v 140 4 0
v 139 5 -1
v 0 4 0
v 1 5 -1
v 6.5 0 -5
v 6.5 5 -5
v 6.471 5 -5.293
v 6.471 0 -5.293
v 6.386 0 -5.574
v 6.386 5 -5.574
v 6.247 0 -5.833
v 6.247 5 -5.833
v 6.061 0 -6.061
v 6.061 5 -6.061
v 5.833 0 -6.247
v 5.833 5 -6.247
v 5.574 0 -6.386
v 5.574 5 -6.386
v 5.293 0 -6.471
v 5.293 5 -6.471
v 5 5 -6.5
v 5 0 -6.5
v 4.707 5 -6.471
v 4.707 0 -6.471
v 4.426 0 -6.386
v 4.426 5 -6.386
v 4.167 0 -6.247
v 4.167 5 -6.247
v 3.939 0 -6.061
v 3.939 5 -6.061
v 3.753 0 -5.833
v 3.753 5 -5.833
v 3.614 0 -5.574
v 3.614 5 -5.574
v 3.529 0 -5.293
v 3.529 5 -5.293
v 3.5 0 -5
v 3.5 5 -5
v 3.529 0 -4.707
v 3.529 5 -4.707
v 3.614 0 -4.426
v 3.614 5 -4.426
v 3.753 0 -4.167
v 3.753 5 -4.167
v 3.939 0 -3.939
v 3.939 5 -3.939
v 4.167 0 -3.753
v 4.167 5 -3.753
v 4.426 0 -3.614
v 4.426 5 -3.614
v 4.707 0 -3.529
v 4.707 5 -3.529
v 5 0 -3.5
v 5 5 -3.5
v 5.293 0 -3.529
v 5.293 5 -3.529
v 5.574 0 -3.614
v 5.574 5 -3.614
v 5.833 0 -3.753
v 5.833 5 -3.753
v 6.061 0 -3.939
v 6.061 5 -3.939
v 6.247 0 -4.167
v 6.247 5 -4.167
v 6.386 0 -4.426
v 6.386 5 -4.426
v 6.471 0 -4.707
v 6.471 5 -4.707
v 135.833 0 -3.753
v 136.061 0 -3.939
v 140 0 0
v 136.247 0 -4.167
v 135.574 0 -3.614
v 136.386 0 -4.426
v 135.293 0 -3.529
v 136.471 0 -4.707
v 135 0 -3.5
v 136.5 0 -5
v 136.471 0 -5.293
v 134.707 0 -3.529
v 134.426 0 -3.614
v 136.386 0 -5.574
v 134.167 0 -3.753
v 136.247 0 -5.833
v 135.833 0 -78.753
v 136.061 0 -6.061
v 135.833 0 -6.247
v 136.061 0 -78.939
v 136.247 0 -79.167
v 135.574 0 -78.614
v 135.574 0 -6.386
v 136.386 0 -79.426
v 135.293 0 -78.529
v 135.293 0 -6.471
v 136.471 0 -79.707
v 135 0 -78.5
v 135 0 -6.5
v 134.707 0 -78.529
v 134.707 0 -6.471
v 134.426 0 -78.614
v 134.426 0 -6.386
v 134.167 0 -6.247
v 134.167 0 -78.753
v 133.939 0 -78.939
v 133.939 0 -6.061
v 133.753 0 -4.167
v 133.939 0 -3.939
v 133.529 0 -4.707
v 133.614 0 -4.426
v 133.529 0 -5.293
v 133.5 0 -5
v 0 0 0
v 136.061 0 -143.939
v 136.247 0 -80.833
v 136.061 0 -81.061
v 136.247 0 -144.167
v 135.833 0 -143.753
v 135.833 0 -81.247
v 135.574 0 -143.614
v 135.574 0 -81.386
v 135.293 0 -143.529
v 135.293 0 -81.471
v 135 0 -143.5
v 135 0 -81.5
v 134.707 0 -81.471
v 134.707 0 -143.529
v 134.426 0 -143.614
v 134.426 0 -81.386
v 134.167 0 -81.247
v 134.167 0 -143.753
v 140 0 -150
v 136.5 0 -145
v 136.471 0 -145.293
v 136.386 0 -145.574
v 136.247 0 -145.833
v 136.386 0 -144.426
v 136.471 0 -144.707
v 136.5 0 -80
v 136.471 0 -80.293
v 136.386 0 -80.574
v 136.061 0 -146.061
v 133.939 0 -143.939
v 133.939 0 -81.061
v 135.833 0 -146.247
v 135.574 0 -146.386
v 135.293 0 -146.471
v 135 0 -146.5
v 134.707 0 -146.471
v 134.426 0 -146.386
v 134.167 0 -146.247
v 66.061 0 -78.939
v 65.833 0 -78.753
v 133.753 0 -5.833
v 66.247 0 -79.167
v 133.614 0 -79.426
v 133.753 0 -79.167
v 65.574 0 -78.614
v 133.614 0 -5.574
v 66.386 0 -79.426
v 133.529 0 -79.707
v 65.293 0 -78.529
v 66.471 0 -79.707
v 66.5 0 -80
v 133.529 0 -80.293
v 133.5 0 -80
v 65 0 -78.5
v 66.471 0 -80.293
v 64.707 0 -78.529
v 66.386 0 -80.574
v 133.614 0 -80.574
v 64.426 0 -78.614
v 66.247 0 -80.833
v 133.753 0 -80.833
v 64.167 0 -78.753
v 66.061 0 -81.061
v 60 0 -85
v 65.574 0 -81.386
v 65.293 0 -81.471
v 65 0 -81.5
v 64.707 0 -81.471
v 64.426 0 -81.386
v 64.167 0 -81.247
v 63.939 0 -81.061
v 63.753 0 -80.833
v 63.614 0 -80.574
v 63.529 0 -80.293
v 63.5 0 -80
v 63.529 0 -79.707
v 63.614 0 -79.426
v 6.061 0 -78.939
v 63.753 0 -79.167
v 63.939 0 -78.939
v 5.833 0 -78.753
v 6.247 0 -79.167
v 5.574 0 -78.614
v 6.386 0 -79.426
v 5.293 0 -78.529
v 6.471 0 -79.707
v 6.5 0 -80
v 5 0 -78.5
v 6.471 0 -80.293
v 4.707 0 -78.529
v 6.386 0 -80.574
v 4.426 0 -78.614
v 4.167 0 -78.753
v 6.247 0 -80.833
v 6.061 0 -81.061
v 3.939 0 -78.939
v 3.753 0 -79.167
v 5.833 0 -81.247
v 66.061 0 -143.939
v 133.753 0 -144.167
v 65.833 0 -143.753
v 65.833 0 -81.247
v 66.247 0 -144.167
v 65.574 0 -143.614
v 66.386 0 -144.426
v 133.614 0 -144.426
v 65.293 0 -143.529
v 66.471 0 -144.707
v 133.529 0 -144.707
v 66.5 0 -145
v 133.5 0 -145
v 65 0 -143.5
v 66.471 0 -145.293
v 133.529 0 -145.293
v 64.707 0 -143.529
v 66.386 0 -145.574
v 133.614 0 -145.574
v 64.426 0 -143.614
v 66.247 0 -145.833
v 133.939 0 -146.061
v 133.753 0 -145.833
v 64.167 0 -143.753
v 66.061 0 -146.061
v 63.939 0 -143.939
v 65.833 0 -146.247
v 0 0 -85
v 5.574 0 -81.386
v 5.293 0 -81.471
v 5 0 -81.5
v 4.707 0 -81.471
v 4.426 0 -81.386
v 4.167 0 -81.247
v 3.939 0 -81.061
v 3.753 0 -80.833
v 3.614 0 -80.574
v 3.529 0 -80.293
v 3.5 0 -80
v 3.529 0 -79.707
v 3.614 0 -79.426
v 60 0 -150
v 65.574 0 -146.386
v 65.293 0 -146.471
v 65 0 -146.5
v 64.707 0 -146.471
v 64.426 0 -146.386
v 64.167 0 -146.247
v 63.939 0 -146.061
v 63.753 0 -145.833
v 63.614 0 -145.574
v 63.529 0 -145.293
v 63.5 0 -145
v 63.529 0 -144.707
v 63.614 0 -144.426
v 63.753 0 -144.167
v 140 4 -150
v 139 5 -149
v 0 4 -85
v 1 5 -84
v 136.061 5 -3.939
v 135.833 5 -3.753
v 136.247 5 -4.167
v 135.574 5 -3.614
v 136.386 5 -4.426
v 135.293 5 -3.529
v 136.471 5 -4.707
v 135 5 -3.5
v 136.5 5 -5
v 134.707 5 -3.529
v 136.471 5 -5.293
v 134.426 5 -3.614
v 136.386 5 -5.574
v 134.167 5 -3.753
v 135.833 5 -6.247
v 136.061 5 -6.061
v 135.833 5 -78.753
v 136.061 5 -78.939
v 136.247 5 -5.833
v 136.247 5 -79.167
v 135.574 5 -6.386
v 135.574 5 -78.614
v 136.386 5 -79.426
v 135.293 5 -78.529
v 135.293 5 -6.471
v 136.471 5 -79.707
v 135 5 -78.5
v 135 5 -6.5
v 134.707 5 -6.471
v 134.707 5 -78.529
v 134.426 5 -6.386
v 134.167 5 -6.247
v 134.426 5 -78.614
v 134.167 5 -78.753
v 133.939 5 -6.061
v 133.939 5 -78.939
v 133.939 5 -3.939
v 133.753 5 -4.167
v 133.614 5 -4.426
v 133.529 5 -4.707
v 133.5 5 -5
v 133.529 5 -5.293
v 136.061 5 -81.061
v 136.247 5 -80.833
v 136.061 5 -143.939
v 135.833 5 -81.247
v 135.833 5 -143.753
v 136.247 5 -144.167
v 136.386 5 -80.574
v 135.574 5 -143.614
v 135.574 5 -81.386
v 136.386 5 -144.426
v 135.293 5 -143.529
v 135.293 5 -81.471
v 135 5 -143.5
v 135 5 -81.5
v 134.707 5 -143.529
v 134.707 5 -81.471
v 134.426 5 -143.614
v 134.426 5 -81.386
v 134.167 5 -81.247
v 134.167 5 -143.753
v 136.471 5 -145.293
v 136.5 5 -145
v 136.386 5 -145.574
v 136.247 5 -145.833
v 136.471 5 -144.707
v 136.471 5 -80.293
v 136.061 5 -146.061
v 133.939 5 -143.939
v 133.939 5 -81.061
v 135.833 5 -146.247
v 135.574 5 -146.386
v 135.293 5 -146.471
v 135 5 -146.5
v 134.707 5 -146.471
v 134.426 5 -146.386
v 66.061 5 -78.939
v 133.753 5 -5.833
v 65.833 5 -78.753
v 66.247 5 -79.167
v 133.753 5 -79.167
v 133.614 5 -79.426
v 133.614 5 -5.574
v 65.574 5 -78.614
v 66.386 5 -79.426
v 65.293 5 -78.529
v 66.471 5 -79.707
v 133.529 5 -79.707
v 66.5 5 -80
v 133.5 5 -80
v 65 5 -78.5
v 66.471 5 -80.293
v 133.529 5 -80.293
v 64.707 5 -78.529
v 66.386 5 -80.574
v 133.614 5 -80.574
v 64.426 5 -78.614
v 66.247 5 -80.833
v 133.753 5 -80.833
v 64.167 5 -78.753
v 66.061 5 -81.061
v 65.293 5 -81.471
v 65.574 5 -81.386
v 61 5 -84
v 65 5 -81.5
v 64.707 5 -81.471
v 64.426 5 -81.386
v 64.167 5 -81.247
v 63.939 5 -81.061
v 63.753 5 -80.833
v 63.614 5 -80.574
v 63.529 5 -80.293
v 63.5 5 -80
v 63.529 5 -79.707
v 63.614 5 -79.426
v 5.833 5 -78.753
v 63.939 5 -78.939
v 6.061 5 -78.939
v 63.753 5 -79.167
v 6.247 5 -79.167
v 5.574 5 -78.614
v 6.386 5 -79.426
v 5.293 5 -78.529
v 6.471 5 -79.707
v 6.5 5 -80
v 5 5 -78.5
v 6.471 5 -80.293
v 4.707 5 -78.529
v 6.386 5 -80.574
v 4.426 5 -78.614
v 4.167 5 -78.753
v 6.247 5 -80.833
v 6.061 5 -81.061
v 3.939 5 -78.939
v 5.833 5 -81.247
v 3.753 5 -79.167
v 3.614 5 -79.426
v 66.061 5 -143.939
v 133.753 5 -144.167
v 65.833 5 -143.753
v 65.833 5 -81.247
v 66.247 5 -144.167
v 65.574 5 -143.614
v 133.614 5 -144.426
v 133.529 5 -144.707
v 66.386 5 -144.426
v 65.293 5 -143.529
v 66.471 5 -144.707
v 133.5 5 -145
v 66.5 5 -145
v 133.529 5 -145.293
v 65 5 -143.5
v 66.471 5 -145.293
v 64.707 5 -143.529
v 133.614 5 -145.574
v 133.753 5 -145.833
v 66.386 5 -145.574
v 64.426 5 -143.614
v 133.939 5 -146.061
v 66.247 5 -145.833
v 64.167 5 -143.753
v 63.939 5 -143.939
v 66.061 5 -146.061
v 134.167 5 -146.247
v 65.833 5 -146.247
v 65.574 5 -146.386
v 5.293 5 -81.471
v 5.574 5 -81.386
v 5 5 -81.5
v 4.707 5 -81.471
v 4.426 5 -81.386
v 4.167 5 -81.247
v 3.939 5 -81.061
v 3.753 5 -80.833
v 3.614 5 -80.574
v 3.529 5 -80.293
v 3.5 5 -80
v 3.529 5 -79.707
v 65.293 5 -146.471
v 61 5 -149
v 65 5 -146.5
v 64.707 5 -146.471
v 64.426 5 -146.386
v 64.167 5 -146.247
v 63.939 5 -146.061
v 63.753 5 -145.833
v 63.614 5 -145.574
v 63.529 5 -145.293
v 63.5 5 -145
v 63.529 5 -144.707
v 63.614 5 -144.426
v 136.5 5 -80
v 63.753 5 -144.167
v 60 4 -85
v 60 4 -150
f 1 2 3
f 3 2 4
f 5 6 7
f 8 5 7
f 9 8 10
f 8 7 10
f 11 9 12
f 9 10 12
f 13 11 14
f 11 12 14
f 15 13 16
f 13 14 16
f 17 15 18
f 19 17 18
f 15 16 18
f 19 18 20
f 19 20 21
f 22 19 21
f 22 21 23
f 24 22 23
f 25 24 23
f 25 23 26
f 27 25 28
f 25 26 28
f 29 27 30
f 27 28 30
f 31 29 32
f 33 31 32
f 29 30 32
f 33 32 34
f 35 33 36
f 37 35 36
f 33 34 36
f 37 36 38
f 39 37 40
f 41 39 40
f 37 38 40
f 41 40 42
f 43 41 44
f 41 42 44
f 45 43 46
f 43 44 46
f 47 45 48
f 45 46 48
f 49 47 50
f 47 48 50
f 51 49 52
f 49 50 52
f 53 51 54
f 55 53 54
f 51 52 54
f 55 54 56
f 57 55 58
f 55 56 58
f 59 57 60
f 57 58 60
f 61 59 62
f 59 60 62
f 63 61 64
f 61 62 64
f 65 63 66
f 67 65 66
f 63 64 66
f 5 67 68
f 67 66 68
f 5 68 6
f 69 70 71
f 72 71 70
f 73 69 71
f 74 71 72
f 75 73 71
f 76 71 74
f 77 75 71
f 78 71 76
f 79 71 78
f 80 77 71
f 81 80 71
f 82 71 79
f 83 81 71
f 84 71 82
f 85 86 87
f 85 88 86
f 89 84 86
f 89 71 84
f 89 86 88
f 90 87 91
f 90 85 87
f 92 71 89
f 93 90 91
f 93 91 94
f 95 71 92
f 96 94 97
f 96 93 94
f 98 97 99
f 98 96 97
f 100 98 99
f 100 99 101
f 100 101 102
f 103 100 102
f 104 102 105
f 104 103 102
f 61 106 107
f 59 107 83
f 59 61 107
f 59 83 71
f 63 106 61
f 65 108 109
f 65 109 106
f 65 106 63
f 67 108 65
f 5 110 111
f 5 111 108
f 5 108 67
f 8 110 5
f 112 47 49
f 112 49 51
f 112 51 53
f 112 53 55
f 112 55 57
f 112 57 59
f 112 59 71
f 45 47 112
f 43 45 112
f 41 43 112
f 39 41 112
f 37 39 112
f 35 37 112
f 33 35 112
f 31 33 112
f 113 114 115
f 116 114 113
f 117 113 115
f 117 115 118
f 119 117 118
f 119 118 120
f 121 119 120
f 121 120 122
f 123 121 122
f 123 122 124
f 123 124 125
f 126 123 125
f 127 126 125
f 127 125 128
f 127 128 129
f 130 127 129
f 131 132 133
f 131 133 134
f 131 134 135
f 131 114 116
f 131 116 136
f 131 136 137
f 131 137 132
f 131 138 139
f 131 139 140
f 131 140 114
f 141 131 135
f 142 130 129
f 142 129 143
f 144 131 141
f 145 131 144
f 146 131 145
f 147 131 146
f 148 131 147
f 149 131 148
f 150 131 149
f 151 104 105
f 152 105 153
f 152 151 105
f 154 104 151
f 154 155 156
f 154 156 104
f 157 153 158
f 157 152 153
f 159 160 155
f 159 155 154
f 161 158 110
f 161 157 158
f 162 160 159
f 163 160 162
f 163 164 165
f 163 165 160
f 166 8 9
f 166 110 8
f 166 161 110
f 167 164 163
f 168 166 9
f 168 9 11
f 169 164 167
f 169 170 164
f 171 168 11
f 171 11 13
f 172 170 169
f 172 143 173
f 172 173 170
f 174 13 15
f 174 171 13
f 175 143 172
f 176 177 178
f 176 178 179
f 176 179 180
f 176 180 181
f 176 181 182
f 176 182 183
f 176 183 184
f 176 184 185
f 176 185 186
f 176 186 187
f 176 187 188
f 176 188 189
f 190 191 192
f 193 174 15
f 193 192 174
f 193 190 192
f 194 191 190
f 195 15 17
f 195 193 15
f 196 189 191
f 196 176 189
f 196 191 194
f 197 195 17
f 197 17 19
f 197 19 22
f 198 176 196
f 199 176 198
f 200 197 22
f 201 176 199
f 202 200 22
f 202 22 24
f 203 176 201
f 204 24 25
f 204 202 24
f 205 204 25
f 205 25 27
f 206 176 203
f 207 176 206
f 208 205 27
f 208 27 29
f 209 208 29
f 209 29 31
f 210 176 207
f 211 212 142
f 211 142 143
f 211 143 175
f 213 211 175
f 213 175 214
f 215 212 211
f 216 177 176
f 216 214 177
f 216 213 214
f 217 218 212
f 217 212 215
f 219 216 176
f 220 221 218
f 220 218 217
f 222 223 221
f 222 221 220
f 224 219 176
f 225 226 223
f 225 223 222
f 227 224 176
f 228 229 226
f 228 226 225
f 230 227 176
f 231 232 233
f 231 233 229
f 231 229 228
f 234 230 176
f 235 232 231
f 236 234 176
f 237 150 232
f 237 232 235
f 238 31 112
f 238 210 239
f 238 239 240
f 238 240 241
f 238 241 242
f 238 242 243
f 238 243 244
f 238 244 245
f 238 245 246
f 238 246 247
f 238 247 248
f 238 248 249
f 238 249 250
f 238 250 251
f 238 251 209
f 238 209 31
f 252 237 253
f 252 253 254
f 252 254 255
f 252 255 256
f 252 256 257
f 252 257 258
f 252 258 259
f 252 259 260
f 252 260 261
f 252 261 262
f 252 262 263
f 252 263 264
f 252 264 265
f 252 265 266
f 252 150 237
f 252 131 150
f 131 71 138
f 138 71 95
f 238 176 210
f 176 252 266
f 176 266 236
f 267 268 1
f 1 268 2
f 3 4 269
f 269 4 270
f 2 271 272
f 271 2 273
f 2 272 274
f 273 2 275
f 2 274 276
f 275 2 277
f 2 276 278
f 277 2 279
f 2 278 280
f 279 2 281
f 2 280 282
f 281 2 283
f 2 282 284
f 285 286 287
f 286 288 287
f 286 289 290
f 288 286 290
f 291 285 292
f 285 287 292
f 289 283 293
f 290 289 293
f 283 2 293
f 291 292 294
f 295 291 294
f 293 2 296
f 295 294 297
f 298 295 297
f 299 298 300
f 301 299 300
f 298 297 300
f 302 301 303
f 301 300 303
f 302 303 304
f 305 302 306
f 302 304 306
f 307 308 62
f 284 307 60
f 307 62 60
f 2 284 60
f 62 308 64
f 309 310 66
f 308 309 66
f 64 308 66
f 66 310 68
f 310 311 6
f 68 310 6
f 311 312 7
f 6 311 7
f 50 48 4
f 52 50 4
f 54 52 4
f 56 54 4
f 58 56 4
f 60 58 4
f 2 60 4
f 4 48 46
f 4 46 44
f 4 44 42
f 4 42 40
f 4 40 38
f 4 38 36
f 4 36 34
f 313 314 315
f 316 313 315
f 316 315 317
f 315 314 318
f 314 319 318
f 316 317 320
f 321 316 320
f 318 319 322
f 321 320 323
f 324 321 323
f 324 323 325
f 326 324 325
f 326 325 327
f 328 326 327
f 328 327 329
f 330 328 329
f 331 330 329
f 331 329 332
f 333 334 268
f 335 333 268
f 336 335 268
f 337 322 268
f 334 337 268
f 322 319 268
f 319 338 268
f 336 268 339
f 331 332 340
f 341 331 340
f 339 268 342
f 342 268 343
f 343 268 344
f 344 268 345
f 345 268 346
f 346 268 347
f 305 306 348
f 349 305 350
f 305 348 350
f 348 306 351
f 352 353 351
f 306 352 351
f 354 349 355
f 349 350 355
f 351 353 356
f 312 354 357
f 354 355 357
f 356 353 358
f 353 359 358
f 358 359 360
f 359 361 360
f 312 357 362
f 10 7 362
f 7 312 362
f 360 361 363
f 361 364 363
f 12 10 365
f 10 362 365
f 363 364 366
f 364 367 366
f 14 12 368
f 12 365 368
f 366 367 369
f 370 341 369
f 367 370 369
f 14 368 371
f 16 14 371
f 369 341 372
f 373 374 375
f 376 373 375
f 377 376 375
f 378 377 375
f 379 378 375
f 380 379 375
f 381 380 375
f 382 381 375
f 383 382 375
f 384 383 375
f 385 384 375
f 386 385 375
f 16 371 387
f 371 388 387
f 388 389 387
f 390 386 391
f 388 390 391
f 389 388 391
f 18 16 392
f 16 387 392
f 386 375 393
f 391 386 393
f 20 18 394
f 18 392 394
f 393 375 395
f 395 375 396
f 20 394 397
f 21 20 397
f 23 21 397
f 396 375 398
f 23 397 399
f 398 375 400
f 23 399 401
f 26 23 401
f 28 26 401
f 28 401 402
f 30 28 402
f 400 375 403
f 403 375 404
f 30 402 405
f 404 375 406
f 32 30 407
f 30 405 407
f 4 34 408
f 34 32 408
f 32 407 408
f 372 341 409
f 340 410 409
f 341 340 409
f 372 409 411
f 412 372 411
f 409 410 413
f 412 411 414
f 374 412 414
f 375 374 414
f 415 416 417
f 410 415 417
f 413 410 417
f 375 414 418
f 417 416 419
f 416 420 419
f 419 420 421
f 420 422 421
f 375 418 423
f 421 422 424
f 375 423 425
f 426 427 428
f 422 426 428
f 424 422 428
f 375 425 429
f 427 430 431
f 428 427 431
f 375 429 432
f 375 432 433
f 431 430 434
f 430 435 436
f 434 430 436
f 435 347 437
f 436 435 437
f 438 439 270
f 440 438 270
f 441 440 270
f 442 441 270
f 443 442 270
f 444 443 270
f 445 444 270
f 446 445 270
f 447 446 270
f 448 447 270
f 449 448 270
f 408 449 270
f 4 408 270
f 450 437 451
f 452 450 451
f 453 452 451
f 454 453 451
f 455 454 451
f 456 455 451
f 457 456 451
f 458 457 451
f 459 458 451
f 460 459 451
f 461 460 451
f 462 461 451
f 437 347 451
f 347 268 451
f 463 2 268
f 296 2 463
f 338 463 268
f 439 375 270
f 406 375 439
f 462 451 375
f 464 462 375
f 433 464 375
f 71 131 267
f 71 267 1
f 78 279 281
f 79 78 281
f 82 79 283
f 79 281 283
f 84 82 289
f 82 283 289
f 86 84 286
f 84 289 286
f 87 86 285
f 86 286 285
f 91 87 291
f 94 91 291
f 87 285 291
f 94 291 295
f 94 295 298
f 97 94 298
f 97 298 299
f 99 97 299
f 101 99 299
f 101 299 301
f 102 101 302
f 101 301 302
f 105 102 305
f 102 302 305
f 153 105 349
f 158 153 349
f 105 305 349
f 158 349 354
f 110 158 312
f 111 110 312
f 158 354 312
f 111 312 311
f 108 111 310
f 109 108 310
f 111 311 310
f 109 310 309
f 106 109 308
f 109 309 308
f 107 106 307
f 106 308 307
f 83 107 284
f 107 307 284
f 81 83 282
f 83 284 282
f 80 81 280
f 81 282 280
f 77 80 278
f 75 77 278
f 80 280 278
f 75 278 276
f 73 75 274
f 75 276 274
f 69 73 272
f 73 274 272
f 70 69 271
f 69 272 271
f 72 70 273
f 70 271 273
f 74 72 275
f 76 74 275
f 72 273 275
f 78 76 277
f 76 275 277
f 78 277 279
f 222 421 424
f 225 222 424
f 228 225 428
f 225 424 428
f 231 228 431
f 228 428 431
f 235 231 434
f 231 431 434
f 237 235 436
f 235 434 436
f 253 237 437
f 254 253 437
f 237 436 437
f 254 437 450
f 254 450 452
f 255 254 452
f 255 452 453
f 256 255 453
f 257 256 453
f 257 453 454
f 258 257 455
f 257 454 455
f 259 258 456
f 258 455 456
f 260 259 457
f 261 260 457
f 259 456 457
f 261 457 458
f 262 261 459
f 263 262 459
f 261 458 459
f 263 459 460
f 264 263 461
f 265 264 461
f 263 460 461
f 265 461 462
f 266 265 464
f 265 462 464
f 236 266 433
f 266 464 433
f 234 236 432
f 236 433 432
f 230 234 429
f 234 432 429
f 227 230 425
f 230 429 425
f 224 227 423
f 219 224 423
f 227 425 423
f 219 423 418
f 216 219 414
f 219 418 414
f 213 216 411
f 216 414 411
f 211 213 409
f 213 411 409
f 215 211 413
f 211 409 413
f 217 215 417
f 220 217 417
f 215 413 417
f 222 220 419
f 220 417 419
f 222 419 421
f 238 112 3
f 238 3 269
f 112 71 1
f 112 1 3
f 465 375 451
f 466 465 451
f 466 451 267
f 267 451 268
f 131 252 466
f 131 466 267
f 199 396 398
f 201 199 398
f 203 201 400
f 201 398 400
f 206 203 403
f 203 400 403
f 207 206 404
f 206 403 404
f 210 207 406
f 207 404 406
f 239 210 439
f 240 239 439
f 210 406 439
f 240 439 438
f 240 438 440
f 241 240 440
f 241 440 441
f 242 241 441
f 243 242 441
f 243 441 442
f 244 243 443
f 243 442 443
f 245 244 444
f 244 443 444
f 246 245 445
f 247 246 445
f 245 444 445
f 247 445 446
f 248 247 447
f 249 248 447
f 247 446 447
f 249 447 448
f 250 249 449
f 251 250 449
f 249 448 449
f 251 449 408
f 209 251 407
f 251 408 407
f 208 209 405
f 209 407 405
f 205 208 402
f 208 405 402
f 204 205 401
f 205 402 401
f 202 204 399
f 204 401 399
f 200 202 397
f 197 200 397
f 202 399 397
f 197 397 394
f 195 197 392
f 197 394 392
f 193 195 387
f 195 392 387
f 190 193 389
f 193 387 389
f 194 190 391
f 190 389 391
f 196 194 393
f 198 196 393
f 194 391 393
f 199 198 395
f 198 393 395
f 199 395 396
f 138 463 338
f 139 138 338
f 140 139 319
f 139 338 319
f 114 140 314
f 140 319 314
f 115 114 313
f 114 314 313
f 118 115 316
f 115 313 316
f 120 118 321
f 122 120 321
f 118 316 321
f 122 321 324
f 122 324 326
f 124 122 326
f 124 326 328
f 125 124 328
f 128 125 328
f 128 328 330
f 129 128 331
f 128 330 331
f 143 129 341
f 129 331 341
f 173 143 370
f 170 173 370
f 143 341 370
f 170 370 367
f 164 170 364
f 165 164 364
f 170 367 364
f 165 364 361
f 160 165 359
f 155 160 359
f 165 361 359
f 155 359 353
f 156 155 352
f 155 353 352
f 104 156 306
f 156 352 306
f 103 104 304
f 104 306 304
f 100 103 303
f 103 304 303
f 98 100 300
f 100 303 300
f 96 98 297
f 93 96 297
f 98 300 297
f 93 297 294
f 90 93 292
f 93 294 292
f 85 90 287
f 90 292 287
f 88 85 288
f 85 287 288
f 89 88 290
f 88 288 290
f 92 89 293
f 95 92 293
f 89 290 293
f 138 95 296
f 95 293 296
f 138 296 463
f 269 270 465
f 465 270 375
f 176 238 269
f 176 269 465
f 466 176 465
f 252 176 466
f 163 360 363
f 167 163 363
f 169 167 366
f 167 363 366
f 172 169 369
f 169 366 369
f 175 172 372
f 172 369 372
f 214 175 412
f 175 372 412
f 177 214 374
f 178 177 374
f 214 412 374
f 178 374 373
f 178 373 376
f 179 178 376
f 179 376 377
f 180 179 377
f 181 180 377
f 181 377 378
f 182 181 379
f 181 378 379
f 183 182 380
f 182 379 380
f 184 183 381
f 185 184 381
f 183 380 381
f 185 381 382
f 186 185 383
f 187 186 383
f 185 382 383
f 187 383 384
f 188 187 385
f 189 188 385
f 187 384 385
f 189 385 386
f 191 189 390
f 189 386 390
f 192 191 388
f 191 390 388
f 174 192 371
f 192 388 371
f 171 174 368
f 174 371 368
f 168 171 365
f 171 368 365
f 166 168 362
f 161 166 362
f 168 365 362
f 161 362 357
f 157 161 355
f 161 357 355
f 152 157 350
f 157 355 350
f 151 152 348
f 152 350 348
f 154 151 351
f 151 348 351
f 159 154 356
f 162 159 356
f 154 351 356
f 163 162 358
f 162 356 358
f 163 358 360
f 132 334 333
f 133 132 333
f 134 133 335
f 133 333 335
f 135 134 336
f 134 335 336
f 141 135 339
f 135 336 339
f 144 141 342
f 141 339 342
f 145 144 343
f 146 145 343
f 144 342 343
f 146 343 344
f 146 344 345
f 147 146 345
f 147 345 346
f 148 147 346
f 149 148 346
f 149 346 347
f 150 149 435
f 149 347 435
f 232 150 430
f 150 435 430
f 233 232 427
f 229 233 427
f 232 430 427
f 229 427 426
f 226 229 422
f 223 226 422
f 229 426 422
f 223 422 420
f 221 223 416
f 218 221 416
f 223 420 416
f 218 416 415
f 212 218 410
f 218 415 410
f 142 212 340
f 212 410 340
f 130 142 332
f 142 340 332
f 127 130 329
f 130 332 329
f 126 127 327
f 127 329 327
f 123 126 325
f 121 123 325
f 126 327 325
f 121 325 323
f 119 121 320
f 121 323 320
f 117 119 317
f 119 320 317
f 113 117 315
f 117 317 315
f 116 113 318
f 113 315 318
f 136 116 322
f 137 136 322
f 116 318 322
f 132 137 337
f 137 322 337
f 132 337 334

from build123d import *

# Parameters (mm, degrees)
BOSS_EXTRUDE1_DEPTH  = 5
CHAMFER1_SIZE        = 1
SKETCH2_R            = 1.5
CUT_EXTRUDE1_DEPTH   = 5
LPATTERN1_COUNT      = 2
LPATTERN1_PITCH      = 130
LPATTERN1_COUNT_DIR2 = 2
LPATTERN1_PITCH_DIR2 = 75
SKETCH3_R            = 1.5
CUT_EXTRUDE2_DEPTH   = 5
LPATTERN2_COUNT      = 2
LPATTERN2_PITCH      = 70
LPATTERN3_COUNT      = 2
LPATTERN3_PITCH      = 65


with BuildPart() as part:
    # Sketch1 → Boss-Extrude1 (new body)
    with BuildSketch(Plane(origin=(0, 0, 0), x_dir=(1, 0, 0), z_dir=(0, 1, 0))):
        Polygon((140, 150), (140, 0), (0, 0), (0, 85), (60, 85), (60, 150), align=None)
    extrude(amount=BOSS_EXTRUDE1_DEPTH)

    # Chamfer1
    chamfer1_edges = [part.edges().sort_by_distance(p)[0] for p in [
        (140, 5, -75),
        (100, 5, -150),
        (60, 5, -117.5),
        (30, 5, -85),
        (0, 5, -42.5),
        (70, 5, 0),
    ]]
    chamfer(chamfer1_edges, length=CHAMFER1_SIZE)

    # Sketch2 → Cut-Extrude1 (cut)
    with BuildSketch(Plane(origin=(0, 5, 0), x_dir=(1, 0, 0), z_dir=(0, 1, 0))):
        with Locations((5, 80)):
            Circle(SKETCH2_R)
    cut_extrude1 = extrude(amount=-CUT_EXTRUDE1_DEPTH, mode=Mode.SUBTRACT)

    # LPattern1: Cut-Extrude1 2 × 2
    with Locations(*[(i * LPATTERN1_PITCH, 0, j * LPATTERN1_PITCH_DIR2) for i in range(LPATTERN1_COUNT) for j in range(LPATTERN1_COUNT_DIR2) if (i, j) != (0, 0)]):
        add(cut_extrude1, mode=Mode.SUBTRACT)

    # Sketch3 → Cut-Extrude2 (cut)
    with BuildSketch(Plane(origin=(0, 5, 0), x_dir=(1, 0, 0), z_dir=(0, 1, 0))):
        with Locations((65, 145)):
            Circle(SKETCH3_R)
    cut_extrude2 = extrude(amount=-CUT_EXTRUDE2_DEPTH, mode=Mode.SUBTRACT)

    # LPattern2: Cut-Extrude2 ×2
    with Locations(*[(i * LPATTERN2_PITCH, 0, 0) for i in range(1, LPATTERN2_COUNT)]):
        add(cut_extrude2, mode=Mode.SUBTRACT)

    # LPattern3: Cut-Extrude2 ×2
    with Locations(*[(0, 0, i * LPATTERN3_PITCH) for i in range(1, LPATTERN3_COUNT)]):
        add(cut_extrude2, mode=Mode.SUBTRACT)


solid = part.part
